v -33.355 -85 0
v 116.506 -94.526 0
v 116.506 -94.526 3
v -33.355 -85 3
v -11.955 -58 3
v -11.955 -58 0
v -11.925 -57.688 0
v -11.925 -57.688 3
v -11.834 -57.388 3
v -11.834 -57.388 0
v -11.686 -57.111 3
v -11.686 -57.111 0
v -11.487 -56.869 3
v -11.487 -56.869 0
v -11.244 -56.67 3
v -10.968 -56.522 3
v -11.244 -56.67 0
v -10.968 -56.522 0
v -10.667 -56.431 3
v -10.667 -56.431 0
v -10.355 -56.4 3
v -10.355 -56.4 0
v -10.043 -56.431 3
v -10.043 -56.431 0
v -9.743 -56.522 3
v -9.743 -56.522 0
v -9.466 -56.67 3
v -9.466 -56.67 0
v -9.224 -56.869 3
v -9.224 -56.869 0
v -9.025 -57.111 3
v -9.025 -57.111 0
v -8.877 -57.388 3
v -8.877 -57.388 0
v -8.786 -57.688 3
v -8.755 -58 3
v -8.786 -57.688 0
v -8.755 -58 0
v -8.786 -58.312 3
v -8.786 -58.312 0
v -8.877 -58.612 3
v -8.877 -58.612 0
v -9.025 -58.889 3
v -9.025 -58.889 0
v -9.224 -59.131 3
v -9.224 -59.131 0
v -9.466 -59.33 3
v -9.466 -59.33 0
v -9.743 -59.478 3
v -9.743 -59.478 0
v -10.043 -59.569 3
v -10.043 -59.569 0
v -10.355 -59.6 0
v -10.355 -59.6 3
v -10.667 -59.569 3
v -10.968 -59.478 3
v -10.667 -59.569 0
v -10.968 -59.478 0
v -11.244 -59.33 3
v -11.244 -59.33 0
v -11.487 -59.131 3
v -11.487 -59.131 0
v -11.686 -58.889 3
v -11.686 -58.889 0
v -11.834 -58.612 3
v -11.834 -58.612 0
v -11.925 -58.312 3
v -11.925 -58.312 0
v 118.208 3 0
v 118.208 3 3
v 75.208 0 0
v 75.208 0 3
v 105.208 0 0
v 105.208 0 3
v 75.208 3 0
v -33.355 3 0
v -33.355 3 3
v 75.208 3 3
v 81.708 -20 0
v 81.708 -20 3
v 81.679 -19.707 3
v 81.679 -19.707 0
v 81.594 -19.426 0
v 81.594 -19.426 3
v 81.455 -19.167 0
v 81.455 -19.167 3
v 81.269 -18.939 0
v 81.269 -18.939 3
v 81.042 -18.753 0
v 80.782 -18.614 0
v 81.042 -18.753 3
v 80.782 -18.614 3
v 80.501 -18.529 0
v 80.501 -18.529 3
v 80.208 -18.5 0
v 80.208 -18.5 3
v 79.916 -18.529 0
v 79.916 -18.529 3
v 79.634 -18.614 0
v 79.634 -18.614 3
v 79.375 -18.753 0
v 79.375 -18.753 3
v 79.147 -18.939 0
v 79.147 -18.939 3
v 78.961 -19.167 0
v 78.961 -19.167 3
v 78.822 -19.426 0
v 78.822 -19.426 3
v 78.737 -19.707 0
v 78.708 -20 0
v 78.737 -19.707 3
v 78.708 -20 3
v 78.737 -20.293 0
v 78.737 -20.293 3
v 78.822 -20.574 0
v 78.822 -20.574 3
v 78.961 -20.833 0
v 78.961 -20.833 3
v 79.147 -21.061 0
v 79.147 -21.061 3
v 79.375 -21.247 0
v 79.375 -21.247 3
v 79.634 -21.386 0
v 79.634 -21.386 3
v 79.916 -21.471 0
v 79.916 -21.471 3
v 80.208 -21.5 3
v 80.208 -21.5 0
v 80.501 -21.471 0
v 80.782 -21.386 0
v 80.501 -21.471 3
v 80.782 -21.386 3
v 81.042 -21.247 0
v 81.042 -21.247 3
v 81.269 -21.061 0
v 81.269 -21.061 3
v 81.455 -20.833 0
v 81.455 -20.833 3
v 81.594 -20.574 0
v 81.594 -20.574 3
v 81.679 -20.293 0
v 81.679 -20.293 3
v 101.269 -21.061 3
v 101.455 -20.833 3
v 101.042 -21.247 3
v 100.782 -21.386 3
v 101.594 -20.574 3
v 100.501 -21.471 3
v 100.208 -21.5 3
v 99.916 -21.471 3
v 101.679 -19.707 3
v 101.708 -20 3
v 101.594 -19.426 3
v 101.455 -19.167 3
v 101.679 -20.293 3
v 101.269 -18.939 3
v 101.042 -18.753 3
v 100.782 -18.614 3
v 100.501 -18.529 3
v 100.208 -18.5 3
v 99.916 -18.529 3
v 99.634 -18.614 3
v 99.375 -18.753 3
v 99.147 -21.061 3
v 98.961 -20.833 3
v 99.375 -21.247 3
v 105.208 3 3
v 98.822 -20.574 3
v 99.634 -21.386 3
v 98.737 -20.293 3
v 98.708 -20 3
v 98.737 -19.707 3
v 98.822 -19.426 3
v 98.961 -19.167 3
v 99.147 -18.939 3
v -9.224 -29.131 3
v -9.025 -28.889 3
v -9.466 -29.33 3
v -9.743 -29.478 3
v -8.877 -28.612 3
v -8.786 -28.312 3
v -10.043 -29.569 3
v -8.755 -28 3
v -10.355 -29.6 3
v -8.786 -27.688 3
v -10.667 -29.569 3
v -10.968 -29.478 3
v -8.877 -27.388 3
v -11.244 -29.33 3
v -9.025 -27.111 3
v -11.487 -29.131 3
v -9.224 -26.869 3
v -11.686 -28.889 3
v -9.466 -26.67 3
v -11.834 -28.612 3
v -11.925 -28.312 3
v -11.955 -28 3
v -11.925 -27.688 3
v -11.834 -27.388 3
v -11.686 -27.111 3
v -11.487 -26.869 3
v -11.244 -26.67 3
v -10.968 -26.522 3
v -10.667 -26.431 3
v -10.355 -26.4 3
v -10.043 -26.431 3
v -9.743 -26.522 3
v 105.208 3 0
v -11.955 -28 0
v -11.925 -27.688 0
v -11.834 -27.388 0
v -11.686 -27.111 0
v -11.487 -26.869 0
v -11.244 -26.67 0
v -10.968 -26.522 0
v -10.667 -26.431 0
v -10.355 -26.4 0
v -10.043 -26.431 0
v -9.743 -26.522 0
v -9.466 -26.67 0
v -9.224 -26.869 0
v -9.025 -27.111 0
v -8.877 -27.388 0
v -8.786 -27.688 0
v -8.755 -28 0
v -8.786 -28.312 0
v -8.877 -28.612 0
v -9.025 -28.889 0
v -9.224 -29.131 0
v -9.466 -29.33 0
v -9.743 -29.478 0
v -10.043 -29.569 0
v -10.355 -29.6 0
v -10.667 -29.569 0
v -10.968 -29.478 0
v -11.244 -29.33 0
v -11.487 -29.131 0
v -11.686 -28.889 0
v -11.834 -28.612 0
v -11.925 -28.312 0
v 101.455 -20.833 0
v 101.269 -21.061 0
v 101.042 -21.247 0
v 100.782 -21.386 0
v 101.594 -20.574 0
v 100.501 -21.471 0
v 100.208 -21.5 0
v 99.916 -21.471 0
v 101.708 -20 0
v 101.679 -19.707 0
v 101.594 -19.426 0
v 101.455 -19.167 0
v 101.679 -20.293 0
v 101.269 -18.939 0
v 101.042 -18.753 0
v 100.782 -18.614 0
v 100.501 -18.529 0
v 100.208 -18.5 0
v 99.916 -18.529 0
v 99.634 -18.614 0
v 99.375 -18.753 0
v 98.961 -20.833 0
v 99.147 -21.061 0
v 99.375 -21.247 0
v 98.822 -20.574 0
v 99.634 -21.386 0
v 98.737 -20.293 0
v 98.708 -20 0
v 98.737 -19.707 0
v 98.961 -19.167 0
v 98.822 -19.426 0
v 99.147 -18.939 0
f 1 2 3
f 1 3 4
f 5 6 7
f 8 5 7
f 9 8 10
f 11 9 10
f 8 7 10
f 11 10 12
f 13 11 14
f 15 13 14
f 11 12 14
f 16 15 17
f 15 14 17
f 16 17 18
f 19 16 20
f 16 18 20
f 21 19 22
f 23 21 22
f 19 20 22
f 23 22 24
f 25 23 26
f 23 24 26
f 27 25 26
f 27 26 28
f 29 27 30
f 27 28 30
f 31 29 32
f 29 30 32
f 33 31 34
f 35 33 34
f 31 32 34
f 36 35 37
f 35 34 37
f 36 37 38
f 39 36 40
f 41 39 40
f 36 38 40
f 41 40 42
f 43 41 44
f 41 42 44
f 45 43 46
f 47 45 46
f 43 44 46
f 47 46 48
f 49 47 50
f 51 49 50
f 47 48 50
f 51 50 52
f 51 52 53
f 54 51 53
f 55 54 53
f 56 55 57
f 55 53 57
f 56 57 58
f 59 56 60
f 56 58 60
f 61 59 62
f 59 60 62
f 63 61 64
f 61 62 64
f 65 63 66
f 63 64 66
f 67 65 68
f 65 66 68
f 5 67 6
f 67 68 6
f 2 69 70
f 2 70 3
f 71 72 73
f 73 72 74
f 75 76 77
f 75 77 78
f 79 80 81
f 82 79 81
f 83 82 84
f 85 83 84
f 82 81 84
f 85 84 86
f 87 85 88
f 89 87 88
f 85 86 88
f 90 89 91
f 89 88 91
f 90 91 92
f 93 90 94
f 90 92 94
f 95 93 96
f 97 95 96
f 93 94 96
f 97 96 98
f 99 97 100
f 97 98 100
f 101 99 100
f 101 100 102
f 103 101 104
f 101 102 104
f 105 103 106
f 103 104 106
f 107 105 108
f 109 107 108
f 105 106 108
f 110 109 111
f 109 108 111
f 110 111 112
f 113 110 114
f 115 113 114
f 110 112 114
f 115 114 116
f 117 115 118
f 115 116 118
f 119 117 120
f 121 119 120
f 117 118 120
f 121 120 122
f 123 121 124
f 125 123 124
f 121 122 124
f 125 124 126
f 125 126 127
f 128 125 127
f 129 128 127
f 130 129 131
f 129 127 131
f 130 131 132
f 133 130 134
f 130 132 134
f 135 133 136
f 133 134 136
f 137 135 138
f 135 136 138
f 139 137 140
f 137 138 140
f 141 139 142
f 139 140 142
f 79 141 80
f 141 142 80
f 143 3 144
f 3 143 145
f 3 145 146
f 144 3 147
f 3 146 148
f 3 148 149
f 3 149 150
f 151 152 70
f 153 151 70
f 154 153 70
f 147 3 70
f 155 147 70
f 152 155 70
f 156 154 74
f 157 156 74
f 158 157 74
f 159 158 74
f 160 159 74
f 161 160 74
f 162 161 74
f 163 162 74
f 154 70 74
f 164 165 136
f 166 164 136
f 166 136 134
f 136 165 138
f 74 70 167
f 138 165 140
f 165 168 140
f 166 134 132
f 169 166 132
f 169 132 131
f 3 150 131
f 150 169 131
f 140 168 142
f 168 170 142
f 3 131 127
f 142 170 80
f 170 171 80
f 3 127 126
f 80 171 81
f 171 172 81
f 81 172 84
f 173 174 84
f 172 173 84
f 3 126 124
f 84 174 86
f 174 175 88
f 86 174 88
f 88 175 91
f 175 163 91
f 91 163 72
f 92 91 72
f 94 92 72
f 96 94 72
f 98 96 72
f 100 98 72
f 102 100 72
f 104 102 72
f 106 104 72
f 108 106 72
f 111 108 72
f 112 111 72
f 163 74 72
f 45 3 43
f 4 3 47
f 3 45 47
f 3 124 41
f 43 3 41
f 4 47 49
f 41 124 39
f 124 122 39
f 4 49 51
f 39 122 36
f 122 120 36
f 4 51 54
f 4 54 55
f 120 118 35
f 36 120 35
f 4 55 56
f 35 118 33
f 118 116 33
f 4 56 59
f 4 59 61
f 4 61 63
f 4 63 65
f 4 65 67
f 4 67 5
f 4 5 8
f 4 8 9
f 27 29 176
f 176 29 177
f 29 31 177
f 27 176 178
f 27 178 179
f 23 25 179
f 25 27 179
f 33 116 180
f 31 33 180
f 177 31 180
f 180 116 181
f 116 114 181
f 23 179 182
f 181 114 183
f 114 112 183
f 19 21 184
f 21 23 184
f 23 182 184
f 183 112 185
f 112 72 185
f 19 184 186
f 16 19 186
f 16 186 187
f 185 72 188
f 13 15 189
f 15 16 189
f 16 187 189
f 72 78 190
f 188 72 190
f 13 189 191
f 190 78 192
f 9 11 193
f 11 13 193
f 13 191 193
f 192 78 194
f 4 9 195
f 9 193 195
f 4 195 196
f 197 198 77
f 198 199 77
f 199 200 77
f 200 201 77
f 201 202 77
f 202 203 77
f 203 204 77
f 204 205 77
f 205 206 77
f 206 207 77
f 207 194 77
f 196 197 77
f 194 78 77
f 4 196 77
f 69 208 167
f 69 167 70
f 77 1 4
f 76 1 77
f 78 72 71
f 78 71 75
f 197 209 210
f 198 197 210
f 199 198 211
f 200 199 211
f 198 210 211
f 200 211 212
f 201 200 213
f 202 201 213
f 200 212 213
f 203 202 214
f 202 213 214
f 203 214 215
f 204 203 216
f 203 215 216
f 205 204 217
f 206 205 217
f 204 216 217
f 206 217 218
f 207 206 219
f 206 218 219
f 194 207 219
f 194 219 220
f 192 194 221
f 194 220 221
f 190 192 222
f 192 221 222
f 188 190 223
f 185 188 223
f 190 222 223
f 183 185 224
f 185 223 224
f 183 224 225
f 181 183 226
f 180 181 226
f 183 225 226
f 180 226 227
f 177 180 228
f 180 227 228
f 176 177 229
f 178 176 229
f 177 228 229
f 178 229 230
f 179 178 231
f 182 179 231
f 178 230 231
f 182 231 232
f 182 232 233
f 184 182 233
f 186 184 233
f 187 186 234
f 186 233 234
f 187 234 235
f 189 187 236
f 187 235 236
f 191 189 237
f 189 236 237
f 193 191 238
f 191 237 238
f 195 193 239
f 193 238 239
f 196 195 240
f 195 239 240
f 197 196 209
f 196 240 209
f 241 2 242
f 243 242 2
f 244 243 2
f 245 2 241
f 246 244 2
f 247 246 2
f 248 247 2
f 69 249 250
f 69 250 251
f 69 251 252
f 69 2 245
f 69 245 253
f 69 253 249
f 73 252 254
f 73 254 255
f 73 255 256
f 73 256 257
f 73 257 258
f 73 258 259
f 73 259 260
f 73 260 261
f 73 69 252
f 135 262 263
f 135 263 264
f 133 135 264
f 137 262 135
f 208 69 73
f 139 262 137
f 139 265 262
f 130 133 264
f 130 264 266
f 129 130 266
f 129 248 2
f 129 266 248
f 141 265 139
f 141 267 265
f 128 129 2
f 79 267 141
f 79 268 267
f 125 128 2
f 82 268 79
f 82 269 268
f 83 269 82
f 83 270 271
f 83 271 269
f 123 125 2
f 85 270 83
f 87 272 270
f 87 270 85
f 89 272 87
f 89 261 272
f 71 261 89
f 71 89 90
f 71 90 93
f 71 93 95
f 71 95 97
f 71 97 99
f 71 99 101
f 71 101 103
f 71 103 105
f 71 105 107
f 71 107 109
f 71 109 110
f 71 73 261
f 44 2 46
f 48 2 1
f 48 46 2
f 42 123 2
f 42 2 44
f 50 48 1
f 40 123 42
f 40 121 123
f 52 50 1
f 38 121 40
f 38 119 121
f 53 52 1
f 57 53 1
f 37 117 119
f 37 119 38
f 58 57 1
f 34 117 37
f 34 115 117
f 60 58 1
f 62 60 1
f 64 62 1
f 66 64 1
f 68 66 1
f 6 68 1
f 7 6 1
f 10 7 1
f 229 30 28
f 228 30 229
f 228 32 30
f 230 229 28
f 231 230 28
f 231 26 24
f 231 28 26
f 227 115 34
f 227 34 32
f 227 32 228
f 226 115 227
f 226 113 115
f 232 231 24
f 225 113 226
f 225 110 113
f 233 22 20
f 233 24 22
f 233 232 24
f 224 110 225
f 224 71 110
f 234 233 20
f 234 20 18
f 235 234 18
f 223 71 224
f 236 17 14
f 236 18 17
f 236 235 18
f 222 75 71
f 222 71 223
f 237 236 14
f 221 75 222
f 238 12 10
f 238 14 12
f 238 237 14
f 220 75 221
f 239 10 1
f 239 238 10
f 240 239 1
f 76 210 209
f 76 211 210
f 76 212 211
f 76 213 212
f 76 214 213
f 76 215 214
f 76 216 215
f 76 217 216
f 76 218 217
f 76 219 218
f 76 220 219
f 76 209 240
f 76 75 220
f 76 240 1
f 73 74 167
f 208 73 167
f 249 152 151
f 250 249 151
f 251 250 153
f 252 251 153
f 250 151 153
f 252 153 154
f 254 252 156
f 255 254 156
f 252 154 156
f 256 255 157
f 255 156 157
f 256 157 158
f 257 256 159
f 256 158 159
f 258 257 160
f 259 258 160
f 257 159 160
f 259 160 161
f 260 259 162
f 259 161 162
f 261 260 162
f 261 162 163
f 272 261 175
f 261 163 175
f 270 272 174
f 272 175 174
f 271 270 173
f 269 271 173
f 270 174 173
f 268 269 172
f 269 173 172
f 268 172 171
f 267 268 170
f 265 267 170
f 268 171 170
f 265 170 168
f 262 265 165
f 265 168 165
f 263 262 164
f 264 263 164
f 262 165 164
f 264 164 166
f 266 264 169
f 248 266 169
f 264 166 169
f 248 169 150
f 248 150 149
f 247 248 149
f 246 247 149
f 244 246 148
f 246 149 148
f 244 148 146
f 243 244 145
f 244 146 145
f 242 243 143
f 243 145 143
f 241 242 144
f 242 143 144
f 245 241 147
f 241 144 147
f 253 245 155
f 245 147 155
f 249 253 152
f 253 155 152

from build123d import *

# Parameters (mm, degrees)
BOSS_EXTRUDE1_DEPTH = 3
SKETCH2_W           = 30
SKETCH2_H           = 3
SKETCH2_R           = 1.5
CUT_EXTRUDE1_DEPTH  = 3
SKETCH3_R           = 1.6
CUT_EXTRUDE2_DEPTH  = 3


with BuildPart() as part:
    # Sketch1 → Boss-Extrude1 (new body)
    with BuildSketch(Plane.XY):
        Polygon((-33.355339059, 3), (118.208152802, 3), (116.505826096, -94.526231635), (-33.355339059, -85), align=None)
    extrude(amount=BOSS_EXTRUDE1_DEPTH)

    # Sketch2 → Cut-Extrude1 (cut)
    with BuildSketch(Plane.XY.offset(3)):
        with Locations((90.208152802, 1.5)):
            Rectangle(SKETCH2_W, SKETCH2_H)
        with Locations((80.208152802, -20)):
            Circle(SKETCH2_R)
        with Locations((100.208152802, -20)):
            Circle(SKETCH2_R)
    extrude(amount=-CUT_EXTRUDE1_DEPTH, mode=Mode.SUBTRACT)

    # Sketch3 → Cut-Extrude2 (cut)
    with BuildSketch(Plane(origin=(0, 0, 0), x_dir=(-1, 0, 0), z_dir=(0, 0, -1))):
        with Locations((10.355339059, -28)):
            Circle(SKETCH3_R)
        with Locations((10.355339059, -58)):
            Circle(SKETCH3_R)
    extrude(amount=-CUT_EXTRUDE2_DEPTH, mode=Mode.SUBTRACT)


solid = part.part
